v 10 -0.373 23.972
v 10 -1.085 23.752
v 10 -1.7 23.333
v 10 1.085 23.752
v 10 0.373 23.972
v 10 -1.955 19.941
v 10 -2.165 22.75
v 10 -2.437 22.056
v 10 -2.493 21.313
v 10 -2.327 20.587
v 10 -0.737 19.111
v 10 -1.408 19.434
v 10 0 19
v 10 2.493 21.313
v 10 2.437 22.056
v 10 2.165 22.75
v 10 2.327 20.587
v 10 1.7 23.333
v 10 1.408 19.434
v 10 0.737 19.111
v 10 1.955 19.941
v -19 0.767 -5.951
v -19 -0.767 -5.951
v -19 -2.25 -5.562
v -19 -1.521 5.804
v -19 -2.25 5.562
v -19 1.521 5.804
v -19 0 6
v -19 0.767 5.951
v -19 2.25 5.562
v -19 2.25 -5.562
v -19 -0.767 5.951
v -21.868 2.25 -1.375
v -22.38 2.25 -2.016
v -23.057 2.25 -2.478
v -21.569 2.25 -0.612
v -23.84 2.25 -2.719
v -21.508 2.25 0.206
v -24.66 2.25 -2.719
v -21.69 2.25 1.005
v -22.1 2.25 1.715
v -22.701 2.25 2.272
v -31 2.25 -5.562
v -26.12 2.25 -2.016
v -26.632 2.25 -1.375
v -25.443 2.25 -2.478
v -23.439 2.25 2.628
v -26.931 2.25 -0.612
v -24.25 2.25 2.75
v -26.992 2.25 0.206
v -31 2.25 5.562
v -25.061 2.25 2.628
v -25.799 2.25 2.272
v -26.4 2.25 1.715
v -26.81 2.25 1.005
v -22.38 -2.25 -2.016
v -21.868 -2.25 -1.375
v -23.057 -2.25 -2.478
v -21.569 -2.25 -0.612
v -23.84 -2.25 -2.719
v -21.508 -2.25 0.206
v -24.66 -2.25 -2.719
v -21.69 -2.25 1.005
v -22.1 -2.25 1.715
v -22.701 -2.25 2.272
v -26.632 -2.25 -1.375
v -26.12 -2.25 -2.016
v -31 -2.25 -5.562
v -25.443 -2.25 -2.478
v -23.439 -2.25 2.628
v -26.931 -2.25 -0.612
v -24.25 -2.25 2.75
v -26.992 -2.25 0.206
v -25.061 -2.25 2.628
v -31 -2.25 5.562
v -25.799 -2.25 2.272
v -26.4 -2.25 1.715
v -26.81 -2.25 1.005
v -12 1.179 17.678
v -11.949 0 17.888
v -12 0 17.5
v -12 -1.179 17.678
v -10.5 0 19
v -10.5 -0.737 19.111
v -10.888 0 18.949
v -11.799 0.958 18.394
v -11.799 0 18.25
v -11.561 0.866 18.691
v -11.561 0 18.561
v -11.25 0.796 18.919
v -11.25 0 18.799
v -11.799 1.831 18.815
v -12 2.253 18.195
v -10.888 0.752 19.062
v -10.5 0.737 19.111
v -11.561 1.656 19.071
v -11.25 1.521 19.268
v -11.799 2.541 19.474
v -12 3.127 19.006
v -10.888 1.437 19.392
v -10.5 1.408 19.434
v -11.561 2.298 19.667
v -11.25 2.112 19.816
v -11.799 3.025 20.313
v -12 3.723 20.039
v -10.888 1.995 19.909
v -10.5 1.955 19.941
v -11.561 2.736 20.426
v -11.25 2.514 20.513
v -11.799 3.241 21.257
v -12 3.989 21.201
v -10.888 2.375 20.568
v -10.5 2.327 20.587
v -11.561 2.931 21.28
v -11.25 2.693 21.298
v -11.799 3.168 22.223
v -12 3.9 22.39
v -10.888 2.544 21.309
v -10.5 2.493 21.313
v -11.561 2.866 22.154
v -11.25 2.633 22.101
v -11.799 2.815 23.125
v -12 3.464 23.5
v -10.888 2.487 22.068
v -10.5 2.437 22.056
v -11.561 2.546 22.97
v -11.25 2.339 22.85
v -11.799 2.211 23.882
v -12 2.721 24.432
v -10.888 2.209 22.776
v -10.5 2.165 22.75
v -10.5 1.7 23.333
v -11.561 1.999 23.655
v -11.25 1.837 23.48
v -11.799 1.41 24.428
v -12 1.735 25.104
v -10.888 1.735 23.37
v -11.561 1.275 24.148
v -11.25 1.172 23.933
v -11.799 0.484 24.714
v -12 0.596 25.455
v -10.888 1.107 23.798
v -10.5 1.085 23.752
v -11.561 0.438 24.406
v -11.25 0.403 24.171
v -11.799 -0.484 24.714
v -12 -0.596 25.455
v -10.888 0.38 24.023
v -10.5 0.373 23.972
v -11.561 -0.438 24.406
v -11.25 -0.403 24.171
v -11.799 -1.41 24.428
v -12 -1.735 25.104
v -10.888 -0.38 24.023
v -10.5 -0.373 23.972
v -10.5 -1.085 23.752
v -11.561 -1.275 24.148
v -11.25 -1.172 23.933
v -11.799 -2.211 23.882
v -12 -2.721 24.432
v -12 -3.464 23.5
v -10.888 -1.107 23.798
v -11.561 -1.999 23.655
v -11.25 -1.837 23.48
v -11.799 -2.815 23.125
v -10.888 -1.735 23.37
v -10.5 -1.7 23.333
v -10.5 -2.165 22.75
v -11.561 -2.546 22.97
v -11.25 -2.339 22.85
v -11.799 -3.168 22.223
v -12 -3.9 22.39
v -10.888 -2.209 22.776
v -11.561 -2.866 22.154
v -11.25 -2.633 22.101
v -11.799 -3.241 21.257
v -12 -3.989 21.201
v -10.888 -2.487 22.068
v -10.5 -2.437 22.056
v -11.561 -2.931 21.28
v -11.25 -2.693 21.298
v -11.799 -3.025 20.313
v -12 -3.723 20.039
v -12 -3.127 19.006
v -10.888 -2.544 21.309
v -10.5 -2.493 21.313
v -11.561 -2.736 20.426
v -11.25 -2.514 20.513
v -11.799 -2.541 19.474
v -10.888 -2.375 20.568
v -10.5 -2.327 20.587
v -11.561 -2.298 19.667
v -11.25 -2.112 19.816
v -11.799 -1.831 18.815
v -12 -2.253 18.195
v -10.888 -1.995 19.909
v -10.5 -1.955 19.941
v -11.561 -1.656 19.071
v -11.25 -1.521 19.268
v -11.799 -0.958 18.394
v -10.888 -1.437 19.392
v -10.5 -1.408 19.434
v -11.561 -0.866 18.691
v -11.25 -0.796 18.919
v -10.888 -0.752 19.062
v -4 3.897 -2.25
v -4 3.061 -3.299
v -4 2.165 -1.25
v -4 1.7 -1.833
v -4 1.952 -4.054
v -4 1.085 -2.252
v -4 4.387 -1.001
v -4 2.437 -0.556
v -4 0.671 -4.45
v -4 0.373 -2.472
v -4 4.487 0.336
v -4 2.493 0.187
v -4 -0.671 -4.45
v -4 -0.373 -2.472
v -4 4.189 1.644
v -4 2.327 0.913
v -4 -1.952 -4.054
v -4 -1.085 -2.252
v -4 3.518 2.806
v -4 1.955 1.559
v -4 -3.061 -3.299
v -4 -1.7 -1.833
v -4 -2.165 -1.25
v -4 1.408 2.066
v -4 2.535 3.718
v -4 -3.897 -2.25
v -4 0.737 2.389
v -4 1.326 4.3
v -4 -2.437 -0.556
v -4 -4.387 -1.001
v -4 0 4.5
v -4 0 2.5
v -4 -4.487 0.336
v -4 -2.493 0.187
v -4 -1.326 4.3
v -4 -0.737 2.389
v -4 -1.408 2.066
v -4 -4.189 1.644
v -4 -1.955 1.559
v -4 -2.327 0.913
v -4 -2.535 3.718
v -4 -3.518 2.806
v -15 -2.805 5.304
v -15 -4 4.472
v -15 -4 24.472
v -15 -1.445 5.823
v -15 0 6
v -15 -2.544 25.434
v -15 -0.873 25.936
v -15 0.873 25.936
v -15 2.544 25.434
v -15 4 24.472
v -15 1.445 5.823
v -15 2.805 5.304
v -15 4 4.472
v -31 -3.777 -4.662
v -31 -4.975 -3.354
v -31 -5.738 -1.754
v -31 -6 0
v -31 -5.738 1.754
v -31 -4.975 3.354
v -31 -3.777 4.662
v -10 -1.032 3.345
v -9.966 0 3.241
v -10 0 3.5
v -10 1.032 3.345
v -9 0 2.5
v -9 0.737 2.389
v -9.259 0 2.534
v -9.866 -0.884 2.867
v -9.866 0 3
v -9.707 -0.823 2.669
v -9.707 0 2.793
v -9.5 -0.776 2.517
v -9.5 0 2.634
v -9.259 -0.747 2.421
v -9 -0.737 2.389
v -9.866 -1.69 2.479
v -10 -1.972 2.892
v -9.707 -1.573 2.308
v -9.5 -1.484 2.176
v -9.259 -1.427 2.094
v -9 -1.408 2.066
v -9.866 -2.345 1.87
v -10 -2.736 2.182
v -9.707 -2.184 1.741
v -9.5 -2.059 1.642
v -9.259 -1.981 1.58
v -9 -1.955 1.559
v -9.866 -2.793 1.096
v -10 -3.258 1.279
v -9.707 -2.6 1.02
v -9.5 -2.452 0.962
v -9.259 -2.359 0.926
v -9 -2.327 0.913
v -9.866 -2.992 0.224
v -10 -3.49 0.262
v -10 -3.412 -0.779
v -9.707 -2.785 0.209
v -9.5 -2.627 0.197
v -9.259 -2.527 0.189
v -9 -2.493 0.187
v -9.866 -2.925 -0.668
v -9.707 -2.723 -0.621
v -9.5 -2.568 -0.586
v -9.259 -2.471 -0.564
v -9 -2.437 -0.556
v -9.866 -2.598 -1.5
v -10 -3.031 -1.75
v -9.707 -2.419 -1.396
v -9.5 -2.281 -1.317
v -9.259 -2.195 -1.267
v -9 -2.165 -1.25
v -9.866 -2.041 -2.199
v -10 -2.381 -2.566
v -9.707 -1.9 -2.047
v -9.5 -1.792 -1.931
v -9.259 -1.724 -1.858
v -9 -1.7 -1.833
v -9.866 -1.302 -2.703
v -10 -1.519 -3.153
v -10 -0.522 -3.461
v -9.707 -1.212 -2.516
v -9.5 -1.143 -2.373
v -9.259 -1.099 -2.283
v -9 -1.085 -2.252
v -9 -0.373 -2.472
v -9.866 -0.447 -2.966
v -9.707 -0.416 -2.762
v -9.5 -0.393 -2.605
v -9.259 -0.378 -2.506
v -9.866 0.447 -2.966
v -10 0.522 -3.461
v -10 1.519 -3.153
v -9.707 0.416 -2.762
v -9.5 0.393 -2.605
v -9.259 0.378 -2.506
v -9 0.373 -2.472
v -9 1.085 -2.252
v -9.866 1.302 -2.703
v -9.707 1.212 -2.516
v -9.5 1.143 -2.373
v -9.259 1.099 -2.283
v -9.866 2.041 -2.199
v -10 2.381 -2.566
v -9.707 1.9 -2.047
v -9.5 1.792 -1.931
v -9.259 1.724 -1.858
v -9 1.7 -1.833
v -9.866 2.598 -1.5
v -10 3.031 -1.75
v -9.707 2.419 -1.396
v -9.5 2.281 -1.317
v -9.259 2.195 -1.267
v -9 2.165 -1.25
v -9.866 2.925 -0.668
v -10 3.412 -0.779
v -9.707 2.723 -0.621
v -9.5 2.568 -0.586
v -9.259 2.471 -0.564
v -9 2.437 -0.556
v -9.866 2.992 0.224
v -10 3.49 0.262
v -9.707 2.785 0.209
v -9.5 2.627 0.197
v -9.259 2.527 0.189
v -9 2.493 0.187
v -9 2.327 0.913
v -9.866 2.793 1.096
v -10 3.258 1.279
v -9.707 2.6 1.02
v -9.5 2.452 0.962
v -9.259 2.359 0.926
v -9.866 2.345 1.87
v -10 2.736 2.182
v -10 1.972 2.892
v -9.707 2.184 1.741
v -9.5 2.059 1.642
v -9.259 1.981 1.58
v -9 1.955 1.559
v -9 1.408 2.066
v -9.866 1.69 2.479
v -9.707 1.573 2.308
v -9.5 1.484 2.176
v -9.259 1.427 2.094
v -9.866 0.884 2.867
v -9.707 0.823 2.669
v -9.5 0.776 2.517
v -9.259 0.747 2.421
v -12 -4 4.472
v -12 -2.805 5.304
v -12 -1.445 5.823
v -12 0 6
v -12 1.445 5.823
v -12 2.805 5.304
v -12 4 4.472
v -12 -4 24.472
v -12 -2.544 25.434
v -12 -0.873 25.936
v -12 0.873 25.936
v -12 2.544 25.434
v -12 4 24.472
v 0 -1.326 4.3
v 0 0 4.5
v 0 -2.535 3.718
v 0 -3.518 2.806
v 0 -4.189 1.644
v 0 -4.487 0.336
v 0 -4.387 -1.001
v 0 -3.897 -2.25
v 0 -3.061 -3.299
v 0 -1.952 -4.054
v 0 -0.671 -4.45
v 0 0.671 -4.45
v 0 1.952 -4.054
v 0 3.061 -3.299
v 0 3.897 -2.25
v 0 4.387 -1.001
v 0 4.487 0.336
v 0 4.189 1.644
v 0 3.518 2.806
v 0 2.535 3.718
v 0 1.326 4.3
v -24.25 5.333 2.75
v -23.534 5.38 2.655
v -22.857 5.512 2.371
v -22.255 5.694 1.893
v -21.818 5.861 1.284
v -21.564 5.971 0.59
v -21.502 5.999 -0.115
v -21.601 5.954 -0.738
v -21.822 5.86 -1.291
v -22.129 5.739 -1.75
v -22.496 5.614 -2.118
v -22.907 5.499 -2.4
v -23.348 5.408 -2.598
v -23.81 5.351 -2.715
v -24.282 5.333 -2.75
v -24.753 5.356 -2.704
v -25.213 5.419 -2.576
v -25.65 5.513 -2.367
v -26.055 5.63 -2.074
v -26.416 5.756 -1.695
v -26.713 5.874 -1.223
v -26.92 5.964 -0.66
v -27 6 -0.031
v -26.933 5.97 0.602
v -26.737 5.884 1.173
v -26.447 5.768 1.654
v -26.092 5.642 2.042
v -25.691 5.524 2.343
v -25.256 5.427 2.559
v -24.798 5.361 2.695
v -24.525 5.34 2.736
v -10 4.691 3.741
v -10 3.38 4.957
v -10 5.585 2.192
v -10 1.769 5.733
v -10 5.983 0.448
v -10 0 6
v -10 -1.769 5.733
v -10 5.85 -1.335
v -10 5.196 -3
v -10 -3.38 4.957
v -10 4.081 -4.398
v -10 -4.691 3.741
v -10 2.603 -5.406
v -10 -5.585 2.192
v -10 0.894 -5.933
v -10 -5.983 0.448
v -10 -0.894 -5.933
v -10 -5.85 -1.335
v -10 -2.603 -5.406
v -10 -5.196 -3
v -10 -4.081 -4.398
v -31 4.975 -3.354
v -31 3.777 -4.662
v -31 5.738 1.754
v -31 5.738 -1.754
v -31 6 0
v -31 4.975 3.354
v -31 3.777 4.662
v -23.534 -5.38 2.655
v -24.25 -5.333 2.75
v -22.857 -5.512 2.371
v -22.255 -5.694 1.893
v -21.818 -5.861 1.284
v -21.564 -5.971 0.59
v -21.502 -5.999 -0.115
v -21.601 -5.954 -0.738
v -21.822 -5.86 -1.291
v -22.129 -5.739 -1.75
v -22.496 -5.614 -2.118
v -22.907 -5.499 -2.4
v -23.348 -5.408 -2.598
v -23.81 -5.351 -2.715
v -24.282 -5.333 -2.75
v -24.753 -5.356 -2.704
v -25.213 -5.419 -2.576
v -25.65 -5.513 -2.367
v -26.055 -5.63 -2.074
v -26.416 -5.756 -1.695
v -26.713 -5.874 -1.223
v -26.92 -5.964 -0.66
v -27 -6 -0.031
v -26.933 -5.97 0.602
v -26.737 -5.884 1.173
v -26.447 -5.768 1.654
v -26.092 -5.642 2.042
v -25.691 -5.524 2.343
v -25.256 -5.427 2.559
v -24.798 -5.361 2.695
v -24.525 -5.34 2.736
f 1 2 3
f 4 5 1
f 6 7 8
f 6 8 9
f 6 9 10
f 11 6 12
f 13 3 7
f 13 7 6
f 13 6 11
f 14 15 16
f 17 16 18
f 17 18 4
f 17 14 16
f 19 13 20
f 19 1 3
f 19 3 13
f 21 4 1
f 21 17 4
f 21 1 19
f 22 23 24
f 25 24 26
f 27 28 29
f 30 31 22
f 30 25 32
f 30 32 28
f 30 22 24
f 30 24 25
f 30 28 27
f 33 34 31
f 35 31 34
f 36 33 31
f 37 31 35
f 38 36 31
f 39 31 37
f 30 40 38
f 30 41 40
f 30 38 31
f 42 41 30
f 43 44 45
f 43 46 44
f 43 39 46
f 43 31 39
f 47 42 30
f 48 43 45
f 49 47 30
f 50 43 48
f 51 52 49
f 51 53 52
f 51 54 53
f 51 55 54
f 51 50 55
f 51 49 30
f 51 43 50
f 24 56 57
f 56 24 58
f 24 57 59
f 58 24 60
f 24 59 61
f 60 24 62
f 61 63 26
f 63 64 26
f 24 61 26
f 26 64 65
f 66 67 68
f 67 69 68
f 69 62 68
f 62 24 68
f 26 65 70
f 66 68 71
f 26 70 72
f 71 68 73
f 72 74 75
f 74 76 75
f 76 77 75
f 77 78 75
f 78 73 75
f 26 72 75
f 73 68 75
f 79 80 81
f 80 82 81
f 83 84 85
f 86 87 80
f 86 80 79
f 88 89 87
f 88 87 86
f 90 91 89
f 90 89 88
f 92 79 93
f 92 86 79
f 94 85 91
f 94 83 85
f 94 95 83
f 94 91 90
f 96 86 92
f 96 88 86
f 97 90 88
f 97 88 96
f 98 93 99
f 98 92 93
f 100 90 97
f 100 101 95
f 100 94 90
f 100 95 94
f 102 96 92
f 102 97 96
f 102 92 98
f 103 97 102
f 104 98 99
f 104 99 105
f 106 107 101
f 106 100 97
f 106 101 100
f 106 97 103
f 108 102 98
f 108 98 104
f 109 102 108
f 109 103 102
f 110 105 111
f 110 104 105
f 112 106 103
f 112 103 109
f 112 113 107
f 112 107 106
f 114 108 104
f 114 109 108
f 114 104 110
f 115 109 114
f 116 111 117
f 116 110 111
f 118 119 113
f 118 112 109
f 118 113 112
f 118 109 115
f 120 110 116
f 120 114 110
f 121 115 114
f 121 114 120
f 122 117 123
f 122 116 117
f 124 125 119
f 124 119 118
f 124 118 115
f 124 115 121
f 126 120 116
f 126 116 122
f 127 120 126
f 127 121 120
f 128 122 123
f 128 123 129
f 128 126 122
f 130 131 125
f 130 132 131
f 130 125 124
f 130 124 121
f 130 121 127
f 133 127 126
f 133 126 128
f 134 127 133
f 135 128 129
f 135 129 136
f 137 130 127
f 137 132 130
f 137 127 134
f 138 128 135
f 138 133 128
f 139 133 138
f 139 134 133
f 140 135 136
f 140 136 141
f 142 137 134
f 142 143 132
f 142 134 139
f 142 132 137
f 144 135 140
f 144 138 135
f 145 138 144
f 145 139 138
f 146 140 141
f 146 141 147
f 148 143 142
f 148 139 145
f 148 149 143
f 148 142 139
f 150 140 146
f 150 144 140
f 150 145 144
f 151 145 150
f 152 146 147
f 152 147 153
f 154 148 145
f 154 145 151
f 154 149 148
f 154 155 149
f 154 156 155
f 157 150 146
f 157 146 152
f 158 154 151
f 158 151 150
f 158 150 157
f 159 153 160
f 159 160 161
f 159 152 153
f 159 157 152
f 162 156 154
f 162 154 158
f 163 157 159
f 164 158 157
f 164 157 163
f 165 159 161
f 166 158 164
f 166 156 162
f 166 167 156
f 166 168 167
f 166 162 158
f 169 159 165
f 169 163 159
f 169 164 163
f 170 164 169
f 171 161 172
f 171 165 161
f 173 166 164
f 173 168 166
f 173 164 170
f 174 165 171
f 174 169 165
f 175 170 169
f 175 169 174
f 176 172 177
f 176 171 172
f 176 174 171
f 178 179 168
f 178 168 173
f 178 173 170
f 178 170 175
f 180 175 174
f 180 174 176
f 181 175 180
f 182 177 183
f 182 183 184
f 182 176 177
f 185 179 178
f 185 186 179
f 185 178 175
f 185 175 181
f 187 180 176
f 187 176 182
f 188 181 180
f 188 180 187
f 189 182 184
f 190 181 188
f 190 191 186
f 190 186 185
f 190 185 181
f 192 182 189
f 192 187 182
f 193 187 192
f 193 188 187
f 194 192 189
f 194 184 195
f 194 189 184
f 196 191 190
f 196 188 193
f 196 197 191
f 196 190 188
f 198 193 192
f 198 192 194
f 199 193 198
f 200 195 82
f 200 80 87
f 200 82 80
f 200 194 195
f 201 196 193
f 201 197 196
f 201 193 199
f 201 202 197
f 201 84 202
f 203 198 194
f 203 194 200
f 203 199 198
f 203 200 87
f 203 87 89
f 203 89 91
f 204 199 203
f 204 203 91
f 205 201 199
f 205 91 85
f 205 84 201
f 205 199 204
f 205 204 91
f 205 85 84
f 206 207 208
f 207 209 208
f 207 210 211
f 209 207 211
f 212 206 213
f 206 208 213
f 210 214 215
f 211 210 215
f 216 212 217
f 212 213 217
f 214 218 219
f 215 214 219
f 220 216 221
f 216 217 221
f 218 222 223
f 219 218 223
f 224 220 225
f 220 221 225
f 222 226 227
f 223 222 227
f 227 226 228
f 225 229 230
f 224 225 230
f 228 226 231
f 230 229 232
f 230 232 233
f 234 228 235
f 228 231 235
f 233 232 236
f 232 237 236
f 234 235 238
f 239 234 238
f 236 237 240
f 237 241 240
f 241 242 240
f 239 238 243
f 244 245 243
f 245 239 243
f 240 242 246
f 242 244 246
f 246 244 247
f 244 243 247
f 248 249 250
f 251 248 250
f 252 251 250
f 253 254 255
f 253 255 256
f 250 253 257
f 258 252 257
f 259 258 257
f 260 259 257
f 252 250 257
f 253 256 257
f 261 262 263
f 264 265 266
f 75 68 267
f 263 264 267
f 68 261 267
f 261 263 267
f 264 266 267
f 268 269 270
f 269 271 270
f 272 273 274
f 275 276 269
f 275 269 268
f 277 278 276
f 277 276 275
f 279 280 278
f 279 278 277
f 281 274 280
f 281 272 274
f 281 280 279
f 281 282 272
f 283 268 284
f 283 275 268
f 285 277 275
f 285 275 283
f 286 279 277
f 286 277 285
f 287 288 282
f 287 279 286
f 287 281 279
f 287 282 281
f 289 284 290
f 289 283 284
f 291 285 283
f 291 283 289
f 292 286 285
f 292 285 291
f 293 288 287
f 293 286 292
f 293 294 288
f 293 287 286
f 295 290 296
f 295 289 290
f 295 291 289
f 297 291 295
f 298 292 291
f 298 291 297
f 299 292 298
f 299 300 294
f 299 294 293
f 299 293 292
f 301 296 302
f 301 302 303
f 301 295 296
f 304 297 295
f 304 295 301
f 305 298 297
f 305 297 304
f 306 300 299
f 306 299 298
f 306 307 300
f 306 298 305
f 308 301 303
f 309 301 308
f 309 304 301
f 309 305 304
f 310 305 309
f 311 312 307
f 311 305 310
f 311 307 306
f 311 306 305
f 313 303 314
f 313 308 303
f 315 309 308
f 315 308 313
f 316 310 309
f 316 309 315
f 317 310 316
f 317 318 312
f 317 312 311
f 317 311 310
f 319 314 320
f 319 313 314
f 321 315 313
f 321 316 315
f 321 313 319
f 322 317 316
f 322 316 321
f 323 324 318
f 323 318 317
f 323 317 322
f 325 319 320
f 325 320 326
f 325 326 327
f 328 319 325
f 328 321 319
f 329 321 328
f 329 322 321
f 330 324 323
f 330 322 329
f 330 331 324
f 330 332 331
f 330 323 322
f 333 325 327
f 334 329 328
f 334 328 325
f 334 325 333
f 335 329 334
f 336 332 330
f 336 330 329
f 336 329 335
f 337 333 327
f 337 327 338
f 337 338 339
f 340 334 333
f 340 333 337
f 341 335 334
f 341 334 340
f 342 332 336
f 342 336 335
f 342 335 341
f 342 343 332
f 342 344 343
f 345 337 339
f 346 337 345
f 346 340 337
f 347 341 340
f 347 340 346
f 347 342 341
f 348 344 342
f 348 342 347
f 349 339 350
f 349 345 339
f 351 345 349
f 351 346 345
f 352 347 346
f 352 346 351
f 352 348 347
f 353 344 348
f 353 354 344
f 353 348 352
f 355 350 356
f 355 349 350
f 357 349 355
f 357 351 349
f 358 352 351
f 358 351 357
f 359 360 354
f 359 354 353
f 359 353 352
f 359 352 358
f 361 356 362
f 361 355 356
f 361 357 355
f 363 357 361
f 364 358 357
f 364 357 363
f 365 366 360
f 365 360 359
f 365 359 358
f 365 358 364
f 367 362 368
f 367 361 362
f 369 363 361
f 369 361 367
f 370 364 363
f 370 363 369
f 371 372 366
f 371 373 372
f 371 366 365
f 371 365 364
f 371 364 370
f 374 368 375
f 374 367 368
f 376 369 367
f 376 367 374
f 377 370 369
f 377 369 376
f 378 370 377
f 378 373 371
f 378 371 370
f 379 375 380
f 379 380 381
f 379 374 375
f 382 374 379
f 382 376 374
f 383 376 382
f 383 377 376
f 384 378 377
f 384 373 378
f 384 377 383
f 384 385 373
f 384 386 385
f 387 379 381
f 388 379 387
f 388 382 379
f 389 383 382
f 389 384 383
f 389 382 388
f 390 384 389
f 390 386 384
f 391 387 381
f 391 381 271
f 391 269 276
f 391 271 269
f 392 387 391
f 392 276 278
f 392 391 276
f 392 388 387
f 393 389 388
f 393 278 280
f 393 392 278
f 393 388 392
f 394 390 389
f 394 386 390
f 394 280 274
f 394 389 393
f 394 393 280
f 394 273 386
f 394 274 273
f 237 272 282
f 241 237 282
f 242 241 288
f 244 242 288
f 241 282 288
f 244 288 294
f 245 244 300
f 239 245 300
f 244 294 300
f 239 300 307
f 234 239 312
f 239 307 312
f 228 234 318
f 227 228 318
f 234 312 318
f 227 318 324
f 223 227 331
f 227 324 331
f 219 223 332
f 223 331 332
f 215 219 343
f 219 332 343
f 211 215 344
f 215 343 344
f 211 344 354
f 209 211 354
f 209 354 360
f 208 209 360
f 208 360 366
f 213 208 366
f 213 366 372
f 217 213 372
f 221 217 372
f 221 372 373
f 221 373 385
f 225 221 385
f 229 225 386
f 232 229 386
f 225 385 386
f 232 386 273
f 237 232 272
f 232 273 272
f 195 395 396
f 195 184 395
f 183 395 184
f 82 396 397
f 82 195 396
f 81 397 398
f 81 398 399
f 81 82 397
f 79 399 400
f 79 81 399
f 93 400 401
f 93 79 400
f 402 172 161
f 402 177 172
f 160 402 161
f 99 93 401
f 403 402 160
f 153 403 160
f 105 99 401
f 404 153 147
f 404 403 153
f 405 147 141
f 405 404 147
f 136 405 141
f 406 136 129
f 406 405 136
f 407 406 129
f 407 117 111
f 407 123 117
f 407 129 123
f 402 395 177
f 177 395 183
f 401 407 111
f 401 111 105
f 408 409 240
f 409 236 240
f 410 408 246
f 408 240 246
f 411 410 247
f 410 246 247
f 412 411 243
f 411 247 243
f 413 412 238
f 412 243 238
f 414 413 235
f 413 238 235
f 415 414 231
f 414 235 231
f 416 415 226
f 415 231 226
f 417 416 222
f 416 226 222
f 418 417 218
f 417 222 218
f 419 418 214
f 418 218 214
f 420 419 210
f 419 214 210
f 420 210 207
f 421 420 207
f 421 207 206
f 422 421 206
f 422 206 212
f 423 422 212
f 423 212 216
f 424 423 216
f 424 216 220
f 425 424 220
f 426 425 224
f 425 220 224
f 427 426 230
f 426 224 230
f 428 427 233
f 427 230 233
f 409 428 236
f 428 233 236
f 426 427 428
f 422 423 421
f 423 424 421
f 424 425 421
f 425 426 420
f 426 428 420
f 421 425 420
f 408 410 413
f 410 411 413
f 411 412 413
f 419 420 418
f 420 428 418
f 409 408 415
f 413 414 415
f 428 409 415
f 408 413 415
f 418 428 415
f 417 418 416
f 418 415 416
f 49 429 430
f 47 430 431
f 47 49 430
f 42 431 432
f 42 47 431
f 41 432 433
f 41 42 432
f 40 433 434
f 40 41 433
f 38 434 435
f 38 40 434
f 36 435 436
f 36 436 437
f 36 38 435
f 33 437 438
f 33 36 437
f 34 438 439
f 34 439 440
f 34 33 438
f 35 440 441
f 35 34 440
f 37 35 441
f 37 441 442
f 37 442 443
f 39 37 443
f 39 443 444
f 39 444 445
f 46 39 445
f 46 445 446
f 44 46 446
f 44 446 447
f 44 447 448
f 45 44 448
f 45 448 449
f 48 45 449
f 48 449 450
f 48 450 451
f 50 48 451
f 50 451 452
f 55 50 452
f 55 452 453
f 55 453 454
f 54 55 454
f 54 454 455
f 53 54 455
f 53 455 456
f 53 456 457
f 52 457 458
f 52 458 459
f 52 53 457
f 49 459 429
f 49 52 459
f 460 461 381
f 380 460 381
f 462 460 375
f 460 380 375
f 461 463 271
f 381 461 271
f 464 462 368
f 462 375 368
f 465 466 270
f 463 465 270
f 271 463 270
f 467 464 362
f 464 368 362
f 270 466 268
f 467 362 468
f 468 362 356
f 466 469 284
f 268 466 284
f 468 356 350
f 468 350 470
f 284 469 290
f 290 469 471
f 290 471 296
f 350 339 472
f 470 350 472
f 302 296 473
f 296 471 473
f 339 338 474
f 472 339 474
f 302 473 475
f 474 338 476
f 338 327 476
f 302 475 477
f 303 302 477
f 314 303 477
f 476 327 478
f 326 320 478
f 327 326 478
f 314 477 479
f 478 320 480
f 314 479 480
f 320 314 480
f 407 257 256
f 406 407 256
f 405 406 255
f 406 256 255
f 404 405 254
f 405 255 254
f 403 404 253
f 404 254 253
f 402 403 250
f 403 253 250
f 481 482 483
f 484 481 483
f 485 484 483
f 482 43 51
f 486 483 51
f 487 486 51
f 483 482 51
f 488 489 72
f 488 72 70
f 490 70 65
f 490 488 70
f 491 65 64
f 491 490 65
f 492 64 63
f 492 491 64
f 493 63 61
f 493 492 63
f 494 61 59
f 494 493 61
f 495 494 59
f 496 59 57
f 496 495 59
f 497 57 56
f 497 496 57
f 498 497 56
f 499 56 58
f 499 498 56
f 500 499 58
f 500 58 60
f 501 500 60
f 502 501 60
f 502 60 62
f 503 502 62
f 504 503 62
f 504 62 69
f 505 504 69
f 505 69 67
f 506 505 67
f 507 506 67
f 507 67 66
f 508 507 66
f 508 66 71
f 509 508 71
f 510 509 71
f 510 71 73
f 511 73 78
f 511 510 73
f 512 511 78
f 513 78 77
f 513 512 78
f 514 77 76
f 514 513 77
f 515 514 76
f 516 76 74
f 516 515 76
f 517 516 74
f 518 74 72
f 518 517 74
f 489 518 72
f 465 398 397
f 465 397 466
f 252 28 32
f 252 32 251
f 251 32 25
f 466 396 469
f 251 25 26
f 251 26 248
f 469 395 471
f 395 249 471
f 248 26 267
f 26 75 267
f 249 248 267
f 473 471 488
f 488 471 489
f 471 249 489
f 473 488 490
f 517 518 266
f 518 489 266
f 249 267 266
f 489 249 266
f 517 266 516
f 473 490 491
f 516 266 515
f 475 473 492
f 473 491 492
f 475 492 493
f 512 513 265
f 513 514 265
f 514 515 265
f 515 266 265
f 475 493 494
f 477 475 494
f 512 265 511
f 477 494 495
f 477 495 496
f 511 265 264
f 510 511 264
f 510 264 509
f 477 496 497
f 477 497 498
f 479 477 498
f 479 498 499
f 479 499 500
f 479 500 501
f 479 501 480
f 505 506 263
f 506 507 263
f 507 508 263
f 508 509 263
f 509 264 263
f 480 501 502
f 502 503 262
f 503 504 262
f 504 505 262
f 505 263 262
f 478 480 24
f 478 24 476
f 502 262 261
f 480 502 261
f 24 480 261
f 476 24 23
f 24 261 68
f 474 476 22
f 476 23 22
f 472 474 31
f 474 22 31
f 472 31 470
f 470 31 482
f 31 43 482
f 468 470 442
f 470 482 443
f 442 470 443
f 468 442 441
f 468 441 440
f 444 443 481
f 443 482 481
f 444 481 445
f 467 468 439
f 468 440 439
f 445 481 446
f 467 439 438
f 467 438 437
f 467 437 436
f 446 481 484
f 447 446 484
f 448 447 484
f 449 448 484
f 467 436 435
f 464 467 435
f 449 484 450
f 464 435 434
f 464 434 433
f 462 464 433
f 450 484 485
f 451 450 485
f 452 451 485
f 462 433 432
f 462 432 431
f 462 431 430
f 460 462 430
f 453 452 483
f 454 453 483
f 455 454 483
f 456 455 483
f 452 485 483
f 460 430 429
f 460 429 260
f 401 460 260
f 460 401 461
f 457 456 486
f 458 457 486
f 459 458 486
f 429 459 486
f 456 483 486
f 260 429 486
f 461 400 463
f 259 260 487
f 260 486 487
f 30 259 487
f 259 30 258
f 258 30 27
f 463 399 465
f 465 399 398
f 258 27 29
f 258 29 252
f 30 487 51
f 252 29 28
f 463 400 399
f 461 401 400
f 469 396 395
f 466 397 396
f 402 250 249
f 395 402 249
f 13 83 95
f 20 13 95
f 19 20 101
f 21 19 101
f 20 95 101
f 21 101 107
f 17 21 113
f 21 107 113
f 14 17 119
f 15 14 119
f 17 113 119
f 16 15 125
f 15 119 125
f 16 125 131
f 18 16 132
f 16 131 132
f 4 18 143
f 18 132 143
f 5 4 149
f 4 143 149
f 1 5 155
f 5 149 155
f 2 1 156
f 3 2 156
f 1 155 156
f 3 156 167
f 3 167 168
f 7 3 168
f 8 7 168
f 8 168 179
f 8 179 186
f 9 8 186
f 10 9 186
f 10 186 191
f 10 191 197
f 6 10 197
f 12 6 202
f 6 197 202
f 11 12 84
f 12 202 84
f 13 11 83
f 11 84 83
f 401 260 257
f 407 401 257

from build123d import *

# Parameters (mm, degrees)
SKETCH2_W               = 20.869986484
SKETCH2_H               = 4.5
CUT_EXTRUDE1_DEPTH      = 12
CUT_EXTRUDE2_DEPTH      = 33.14031736
CUT_EXTRUDE2_DEPTH_BACK = 33.14031736
SKETCH3_R               = 2.75
BOSS_EXTRUDE1_START     = -15
BOSS_EXTRUDE1_DEPTH     = 3
SKETCH6_R               = 2.5
BOSS_EXTRUDE2_DEPTH     = 22
FILLET1_R               = 1
FILLET2_R               = 1.5


# Read off the part's stored shape, not the designer's step: Boss-Extrude1
with BuildPart() as part:
    # Sketch1 → Revolve1 (revolve)
    with BuildSketch(Plane(origin=(0, 0, 0), x_dir=(1, 0, 0), z_dir=(0, 1, 0)), mode=Mode.PRIVATE) as revolve1_sk:
        Polygon((0, 0), (0, 4.5), (-4, 4.5), (-4, 2.5), (-10, 2.5), (-10, 6), (-31, 6), (-31, 0), align=None)
    revolve(revolve1_sk.sketch.rotate(Axis((-13.308467742, 0, 0), (1, 0, 0)), 180), axis=Axis((-13.308467742, 0, 0), (1, 0, 0)))

    # Sketch2 → Cut-Extrude1 (cut)
    with BuildSketch(Plane.ZY.offset(31)):
        Rectangle(SKETCH2_W, SKETCH2_H)
    extrude(amount=-CUT_EXTRUDE1_DEPTH, mode=Mode.SUBTRACT)

    # Sketch3 → Cut-Extrude2 (cut, two sides: drawn at the far end of the back side and taken through both)
    with BuildSketch(Plane(origin=(0, 0, 0), x_dir=(1, 0, 0), z_dir=(0, 1, 0)).offset(-CUT_EXTRUDE2_DEPTH_BACK)):
        with Locations(Location((-24.25, 0, 0), (0, 0, 270))):
            Circle(SKETCH3_R)
    extrude(amount=CUT_EXTRUDE2_DEPTH + CUT_EXTRUDE2_DEPTH_BACK, mode=Mode.SUBTRACT)

    # Boss-Extrude1 outline → Boss-Extrude1 (add)
    with BuildSketch(Plane.YZ.offset(BOSS_EXTRUDE1_START)):
        with BuildLine():
            ThreePointArc((4, 24.472135955), (0, 26), (-4, 24.472135955))
            Line((-4, 24.472135955), (-4, 4.472135955))
            ThreePointArc((-4, 4.472135955), (0, 6), (4, 4.472135955))
            Line((4, 4.472135955), (4, 24.472135955))
        make_face()
    extrude(amount=BOSS_EXTRUDE1_DEPTH)

    # Sketch6 → Boss-Extrude2 (add)
    with BuildSketch(Plane(origin=(-12, 0, 0), x_dir=(0, 0, -1), z_dir=(1, 0, 0))):
        with Locations((-21.5, 0)):
            Circle(SKETCH6_R)
    extrude(amount=BOSS_EXTRUDE2_DEPTH)

    # Fillet1
    fillet1_edges = [part.edges().sort_by_distance(p)[0] for p in [
        (-10, 0, -2.5),
    ]]
    fillet(fillet1_edges, radius=FILLET1_R)

    # Fillet2
    fillet2_edges = [part.edges().sort_by_distance(p)[0] for p in [
        (-12, 0, 24),
    ]]
    fillet(fillet2_edges, radius=FILLET2_R - 0.0001)  # a hair under: the kernel refuses the full size


solid = part.part
